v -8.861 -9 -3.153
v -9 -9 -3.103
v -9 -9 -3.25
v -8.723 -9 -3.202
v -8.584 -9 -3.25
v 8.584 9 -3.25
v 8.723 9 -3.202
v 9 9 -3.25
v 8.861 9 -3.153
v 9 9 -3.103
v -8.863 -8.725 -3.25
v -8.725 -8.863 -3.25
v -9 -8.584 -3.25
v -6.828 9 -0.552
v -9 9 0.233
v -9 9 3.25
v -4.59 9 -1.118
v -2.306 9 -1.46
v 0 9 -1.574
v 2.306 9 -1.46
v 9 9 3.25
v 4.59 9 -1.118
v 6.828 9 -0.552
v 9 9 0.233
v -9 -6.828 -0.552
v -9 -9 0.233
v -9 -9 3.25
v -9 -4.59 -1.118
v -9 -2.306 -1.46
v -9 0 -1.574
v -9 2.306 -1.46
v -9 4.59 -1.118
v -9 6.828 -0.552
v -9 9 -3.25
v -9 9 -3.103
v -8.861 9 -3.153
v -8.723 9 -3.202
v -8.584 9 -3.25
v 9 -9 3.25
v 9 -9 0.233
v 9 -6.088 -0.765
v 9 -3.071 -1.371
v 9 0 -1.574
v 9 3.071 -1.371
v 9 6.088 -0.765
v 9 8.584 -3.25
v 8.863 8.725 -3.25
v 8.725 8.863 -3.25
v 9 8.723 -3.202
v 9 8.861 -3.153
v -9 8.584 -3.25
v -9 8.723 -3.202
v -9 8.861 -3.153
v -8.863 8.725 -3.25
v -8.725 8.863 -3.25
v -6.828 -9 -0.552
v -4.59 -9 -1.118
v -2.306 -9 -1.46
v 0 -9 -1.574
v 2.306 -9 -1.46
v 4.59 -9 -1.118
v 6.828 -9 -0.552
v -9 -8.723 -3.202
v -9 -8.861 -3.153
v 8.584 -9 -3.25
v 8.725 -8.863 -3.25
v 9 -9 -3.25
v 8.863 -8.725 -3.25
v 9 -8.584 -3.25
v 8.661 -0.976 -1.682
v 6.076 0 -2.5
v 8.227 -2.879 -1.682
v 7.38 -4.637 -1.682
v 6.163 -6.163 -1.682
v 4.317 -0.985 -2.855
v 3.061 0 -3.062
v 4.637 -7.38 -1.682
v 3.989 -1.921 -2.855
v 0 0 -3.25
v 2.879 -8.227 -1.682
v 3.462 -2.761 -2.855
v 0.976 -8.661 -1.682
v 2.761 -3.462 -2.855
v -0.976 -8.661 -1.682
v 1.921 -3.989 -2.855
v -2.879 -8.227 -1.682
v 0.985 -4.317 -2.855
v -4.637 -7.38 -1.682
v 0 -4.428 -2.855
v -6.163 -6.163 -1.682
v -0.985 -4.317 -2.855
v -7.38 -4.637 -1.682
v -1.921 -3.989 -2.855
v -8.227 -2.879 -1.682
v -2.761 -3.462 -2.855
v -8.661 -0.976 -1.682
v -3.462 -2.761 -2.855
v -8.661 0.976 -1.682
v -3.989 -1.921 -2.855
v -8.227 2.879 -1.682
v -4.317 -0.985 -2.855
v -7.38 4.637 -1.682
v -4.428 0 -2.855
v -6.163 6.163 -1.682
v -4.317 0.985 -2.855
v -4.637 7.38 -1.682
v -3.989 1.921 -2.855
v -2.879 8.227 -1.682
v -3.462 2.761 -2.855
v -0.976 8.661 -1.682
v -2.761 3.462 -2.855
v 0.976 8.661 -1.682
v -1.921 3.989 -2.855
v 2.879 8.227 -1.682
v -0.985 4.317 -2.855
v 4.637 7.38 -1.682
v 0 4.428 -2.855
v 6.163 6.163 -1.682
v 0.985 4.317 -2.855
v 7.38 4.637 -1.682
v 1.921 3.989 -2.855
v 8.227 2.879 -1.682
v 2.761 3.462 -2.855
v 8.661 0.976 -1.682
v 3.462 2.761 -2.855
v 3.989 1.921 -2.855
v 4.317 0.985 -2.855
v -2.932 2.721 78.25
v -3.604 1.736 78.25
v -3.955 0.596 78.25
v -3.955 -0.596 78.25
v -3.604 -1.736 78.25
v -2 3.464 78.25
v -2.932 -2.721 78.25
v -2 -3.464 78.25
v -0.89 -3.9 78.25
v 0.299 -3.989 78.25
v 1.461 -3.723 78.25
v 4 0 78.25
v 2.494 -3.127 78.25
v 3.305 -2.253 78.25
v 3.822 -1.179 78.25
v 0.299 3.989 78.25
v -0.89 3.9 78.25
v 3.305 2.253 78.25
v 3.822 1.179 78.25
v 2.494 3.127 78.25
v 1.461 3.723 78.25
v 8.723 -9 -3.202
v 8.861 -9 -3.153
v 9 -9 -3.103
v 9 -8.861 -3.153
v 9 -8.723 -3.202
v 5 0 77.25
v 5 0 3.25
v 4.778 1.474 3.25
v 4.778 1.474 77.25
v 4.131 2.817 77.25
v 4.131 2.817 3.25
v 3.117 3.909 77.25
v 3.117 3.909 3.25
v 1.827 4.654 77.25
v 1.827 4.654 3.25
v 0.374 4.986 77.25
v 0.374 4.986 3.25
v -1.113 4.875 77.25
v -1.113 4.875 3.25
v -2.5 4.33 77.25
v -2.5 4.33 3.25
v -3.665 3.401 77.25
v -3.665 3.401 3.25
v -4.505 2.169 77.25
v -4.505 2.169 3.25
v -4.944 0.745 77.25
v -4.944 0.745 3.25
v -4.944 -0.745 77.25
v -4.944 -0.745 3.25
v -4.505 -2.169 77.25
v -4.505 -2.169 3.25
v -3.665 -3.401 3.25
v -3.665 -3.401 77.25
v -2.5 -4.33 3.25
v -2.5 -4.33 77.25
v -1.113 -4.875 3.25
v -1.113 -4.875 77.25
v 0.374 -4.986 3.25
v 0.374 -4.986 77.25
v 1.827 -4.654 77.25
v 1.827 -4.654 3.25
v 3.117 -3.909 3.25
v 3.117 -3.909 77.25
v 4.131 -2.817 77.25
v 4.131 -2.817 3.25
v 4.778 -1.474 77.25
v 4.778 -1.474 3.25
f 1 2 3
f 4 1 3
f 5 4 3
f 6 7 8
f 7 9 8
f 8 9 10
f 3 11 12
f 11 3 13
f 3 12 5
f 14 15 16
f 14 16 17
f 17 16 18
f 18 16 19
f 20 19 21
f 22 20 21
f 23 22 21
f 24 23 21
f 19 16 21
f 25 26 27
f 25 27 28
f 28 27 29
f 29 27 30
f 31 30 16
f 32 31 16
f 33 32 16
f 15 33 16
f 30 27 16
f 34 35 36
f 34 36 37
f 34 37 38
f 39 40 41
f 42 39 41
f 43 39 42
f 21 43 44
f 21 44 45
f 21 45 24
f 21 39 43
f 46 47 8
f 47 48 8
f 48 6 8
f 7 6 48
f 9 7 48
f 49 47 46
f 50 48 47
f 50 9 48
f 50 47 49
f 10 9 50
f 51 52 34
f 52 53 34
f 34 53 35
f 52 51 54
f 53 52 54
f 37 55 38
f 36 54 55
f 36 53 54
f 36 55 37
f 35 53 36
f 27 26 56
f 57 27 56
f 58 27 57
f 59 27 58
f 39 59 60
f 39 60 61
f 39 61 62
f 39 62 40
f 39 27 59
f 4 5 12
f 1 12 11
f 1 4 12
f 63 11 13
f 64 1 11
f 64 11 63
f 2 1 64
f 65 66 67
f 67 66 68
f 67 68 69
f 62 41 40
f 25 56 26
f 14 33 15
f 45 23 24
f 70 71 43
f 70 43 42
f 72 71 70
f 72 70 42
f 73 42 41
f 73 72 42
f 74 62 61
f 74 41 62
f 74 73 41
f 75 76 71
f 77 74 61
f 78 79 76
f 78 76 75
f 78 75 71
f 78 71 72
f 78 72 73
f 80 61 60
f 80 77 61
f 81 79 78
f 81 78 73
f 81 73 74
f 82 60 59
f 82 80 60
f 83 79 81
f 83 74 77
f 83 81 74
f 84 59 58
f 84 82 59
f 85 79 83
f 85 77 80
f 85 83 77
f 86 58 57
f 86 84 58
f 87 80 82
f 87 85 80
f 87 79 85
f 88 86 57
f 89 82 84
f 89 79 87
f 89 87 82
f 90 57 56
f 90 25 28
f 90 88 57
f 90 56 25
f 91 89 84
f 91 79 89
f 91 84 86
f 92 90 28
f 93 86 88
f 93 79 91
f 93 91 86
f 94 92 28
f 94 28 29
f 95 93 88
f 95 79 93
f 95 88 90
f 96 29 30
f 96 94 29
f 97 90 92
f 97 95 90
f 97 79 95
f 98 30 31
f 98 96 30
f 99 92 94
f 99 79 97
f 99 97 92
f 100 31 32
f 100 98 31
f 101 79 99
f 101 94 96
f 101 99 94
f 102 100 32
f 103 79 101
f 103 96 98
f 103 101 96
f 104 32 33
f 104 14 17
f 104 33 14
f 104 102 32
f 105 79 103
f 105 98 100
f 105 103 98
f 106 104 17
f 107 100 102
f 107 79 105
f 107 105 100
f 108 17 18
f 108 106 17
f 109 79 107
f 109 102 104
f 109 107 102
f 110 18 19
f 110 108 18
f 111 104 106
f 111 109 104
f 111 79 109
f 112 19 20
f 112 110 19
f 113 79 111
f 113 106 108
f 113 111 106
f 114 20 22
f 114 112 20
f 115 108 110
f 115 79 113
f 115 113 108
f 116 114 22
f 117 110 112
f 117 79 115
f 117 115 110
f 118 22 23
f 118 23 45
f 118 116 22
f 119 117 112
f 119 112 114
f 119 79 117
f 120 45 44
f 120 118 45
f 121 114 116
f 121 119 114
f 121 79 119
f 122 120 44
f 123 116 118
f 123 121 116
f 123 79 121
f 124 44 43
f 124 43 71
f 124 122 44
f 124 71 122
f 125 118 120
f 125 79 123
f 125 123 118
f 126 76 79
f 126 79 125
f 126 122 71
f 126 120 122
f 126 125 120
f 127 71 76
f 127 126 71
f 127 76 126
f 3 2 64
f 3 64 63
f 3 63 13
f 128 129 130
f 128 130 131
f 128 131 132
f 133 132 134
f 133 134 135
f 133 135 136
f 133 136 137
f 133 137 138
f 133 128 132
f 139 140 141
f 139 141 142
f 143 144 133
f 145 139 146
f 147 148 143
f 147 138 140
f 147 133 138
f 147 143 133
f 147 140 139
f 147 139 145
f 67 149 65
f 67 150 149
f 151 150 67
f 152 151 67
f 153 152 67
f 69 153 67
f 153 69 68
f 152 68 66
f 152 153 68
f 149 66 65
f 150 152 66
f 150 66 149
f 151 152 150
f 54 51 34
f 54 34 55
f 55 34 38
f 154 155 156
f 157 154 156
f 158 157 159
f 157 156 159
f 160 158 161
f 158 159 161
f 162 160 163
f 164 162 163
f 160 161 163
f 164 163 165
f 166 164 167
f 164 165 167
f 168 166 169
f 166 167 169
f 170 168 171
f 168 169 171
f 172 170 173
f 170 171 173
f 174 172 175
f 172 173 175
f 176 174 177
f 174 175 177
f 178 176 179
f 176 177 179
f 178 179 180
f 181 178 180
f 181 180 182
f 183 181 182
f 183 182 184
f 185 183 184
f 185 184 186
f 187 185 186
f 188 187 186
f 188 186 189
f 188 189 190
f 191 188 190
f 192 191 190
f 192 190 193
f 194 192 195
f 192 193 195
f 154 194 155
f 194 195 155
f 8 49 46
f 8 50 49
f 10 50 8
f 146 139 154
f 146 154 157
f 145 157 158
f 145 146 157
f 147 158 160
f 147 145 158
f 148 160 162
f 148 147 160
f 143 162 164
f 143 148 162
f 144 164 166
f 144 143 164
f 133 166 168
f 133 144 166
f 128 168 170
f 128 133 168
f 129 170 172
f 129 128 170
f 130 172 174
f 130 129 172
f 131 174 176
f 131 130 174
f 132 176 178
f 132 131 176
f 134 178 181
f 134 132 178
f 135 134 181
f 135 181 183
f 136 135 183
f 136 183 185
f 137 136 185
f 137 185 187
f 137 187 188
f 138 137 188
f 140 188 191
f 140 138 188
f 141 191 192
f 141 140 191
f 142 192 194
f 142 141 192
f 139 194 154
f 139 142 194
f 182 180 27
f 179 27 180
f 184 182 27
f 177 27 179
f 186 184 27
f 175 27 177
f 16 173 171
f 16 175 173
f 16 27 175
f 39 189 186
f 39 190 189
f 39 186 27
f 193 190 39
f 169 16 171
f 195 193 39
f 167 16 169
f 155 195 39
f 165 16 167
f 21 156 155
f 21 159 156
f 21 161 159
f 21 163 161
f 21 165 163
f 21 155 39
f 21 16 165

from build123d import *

# Parameters (mm, degrees)
SKETCH1_W           = 18
SKETCH1_H           = 18
BOSS_EXTRUDE1_DEPTH = 3.25
SKETCH2_R           = 5
BOSS_EXTRUDE3_DEPTH = 75
CHAMFER1_SIZE       = 1


with BuildPart() as part:
    # Sketch1 → Boss-Extrude1 (new, symmetric)
    with BuildSketch(Plane.XY):
        Rectangle(SKETCH1_W, SKETCH1_H)
    extrude(amount=BOSS_EXTRUDE1_DEPTH, both=True)

    # Sketch2 → Boss-Extrude3 (add)
    with BuildSketch(Plane.XY.offset(3.25)):
        Circle(SKETCH2_R)
    extrude(amount=BOSS_EXTRUDE3_DEPTH)

    # Sketch3 → Cut-Revolve1 (revolve, cut)
    with BuildSketch(Plane(origin=(0, 0, 0), x_dir=(1, 0, 0), z_dir=(0, 1, 0))):
        with BuildLine():
            Line((0, 3.25), (0, 6.172726033))
            ThreePointArc((0, 6.172726033), (19.744348927, -2.005651073), (27.922726033, -21.75))
            Line((27.922726033, -21.75), (25, -21.75))
            ThreePointArc((25, -21.75), (17.67766953, -4.07233047), (0, 3.25))
        make_face()
    revolve(axis=Axis((0, 0, 21.75), (0, 0, -1)), mode=Mode.SUBTRACT)


with BuildPart() as cut_revolve1_piece_1:
    # of the separate pieces the step leaves, piece 1, a body of its own (cut_revolve1_pieces)
    add(part.part.solids().sort_by_distance((-9, 9, 0.232565209))[0])

    # Chamfer1
    chamfer1_edges = [cut_revolve1_piece_1.edges().sort_by_distance(p)[0] for p in [
        (-5, 0, 78.25),
    ]]
    chamfer(chamfer1_edges, length=CHAMFER1_SIZE)


with BuildPart() as cut_revolve1_piece_2:
    # of the separate pieces the step leaves, piece 2, a body of its own (cut_revolve1_pieces)
    add(part.part.solids().sort_by_distance((-9, -9, -3.25))[0])


with BuildPart() as cut_revolve1_piece_3:
    # of the separate pieces the step leaves, piece 3, a body of its own (cut_revolve1_pieces)
    add(part.part.solids().sort_by_distance((-9, 9, -3.25))[0])


with BuildPart() as cut_revolve1_piece_4:
    # of the separate pieces the step leaves, piece 4, a body of its own (cut_revolve1_pieces)
    add(part.part.solids().sort_by_distance((8.58362564, 9, -3.25))[0])


with BuildPart() as cut_revolve1_piece_5:
    # of the separate pieces the step leaves, piece 5, a body of its own (cut_revolve1_pieces)
    add(part.part.solids().sort_by_distance((9, -8.58362564, -3.25))[0])


solid = Compound([cut_revolve1_piece_1.part, cut_revolve1_piece_2.part, cut_revolve1_piece_3.part, cut_revolve1_piece_4.part, cut_revolve1_piece_5.part])
